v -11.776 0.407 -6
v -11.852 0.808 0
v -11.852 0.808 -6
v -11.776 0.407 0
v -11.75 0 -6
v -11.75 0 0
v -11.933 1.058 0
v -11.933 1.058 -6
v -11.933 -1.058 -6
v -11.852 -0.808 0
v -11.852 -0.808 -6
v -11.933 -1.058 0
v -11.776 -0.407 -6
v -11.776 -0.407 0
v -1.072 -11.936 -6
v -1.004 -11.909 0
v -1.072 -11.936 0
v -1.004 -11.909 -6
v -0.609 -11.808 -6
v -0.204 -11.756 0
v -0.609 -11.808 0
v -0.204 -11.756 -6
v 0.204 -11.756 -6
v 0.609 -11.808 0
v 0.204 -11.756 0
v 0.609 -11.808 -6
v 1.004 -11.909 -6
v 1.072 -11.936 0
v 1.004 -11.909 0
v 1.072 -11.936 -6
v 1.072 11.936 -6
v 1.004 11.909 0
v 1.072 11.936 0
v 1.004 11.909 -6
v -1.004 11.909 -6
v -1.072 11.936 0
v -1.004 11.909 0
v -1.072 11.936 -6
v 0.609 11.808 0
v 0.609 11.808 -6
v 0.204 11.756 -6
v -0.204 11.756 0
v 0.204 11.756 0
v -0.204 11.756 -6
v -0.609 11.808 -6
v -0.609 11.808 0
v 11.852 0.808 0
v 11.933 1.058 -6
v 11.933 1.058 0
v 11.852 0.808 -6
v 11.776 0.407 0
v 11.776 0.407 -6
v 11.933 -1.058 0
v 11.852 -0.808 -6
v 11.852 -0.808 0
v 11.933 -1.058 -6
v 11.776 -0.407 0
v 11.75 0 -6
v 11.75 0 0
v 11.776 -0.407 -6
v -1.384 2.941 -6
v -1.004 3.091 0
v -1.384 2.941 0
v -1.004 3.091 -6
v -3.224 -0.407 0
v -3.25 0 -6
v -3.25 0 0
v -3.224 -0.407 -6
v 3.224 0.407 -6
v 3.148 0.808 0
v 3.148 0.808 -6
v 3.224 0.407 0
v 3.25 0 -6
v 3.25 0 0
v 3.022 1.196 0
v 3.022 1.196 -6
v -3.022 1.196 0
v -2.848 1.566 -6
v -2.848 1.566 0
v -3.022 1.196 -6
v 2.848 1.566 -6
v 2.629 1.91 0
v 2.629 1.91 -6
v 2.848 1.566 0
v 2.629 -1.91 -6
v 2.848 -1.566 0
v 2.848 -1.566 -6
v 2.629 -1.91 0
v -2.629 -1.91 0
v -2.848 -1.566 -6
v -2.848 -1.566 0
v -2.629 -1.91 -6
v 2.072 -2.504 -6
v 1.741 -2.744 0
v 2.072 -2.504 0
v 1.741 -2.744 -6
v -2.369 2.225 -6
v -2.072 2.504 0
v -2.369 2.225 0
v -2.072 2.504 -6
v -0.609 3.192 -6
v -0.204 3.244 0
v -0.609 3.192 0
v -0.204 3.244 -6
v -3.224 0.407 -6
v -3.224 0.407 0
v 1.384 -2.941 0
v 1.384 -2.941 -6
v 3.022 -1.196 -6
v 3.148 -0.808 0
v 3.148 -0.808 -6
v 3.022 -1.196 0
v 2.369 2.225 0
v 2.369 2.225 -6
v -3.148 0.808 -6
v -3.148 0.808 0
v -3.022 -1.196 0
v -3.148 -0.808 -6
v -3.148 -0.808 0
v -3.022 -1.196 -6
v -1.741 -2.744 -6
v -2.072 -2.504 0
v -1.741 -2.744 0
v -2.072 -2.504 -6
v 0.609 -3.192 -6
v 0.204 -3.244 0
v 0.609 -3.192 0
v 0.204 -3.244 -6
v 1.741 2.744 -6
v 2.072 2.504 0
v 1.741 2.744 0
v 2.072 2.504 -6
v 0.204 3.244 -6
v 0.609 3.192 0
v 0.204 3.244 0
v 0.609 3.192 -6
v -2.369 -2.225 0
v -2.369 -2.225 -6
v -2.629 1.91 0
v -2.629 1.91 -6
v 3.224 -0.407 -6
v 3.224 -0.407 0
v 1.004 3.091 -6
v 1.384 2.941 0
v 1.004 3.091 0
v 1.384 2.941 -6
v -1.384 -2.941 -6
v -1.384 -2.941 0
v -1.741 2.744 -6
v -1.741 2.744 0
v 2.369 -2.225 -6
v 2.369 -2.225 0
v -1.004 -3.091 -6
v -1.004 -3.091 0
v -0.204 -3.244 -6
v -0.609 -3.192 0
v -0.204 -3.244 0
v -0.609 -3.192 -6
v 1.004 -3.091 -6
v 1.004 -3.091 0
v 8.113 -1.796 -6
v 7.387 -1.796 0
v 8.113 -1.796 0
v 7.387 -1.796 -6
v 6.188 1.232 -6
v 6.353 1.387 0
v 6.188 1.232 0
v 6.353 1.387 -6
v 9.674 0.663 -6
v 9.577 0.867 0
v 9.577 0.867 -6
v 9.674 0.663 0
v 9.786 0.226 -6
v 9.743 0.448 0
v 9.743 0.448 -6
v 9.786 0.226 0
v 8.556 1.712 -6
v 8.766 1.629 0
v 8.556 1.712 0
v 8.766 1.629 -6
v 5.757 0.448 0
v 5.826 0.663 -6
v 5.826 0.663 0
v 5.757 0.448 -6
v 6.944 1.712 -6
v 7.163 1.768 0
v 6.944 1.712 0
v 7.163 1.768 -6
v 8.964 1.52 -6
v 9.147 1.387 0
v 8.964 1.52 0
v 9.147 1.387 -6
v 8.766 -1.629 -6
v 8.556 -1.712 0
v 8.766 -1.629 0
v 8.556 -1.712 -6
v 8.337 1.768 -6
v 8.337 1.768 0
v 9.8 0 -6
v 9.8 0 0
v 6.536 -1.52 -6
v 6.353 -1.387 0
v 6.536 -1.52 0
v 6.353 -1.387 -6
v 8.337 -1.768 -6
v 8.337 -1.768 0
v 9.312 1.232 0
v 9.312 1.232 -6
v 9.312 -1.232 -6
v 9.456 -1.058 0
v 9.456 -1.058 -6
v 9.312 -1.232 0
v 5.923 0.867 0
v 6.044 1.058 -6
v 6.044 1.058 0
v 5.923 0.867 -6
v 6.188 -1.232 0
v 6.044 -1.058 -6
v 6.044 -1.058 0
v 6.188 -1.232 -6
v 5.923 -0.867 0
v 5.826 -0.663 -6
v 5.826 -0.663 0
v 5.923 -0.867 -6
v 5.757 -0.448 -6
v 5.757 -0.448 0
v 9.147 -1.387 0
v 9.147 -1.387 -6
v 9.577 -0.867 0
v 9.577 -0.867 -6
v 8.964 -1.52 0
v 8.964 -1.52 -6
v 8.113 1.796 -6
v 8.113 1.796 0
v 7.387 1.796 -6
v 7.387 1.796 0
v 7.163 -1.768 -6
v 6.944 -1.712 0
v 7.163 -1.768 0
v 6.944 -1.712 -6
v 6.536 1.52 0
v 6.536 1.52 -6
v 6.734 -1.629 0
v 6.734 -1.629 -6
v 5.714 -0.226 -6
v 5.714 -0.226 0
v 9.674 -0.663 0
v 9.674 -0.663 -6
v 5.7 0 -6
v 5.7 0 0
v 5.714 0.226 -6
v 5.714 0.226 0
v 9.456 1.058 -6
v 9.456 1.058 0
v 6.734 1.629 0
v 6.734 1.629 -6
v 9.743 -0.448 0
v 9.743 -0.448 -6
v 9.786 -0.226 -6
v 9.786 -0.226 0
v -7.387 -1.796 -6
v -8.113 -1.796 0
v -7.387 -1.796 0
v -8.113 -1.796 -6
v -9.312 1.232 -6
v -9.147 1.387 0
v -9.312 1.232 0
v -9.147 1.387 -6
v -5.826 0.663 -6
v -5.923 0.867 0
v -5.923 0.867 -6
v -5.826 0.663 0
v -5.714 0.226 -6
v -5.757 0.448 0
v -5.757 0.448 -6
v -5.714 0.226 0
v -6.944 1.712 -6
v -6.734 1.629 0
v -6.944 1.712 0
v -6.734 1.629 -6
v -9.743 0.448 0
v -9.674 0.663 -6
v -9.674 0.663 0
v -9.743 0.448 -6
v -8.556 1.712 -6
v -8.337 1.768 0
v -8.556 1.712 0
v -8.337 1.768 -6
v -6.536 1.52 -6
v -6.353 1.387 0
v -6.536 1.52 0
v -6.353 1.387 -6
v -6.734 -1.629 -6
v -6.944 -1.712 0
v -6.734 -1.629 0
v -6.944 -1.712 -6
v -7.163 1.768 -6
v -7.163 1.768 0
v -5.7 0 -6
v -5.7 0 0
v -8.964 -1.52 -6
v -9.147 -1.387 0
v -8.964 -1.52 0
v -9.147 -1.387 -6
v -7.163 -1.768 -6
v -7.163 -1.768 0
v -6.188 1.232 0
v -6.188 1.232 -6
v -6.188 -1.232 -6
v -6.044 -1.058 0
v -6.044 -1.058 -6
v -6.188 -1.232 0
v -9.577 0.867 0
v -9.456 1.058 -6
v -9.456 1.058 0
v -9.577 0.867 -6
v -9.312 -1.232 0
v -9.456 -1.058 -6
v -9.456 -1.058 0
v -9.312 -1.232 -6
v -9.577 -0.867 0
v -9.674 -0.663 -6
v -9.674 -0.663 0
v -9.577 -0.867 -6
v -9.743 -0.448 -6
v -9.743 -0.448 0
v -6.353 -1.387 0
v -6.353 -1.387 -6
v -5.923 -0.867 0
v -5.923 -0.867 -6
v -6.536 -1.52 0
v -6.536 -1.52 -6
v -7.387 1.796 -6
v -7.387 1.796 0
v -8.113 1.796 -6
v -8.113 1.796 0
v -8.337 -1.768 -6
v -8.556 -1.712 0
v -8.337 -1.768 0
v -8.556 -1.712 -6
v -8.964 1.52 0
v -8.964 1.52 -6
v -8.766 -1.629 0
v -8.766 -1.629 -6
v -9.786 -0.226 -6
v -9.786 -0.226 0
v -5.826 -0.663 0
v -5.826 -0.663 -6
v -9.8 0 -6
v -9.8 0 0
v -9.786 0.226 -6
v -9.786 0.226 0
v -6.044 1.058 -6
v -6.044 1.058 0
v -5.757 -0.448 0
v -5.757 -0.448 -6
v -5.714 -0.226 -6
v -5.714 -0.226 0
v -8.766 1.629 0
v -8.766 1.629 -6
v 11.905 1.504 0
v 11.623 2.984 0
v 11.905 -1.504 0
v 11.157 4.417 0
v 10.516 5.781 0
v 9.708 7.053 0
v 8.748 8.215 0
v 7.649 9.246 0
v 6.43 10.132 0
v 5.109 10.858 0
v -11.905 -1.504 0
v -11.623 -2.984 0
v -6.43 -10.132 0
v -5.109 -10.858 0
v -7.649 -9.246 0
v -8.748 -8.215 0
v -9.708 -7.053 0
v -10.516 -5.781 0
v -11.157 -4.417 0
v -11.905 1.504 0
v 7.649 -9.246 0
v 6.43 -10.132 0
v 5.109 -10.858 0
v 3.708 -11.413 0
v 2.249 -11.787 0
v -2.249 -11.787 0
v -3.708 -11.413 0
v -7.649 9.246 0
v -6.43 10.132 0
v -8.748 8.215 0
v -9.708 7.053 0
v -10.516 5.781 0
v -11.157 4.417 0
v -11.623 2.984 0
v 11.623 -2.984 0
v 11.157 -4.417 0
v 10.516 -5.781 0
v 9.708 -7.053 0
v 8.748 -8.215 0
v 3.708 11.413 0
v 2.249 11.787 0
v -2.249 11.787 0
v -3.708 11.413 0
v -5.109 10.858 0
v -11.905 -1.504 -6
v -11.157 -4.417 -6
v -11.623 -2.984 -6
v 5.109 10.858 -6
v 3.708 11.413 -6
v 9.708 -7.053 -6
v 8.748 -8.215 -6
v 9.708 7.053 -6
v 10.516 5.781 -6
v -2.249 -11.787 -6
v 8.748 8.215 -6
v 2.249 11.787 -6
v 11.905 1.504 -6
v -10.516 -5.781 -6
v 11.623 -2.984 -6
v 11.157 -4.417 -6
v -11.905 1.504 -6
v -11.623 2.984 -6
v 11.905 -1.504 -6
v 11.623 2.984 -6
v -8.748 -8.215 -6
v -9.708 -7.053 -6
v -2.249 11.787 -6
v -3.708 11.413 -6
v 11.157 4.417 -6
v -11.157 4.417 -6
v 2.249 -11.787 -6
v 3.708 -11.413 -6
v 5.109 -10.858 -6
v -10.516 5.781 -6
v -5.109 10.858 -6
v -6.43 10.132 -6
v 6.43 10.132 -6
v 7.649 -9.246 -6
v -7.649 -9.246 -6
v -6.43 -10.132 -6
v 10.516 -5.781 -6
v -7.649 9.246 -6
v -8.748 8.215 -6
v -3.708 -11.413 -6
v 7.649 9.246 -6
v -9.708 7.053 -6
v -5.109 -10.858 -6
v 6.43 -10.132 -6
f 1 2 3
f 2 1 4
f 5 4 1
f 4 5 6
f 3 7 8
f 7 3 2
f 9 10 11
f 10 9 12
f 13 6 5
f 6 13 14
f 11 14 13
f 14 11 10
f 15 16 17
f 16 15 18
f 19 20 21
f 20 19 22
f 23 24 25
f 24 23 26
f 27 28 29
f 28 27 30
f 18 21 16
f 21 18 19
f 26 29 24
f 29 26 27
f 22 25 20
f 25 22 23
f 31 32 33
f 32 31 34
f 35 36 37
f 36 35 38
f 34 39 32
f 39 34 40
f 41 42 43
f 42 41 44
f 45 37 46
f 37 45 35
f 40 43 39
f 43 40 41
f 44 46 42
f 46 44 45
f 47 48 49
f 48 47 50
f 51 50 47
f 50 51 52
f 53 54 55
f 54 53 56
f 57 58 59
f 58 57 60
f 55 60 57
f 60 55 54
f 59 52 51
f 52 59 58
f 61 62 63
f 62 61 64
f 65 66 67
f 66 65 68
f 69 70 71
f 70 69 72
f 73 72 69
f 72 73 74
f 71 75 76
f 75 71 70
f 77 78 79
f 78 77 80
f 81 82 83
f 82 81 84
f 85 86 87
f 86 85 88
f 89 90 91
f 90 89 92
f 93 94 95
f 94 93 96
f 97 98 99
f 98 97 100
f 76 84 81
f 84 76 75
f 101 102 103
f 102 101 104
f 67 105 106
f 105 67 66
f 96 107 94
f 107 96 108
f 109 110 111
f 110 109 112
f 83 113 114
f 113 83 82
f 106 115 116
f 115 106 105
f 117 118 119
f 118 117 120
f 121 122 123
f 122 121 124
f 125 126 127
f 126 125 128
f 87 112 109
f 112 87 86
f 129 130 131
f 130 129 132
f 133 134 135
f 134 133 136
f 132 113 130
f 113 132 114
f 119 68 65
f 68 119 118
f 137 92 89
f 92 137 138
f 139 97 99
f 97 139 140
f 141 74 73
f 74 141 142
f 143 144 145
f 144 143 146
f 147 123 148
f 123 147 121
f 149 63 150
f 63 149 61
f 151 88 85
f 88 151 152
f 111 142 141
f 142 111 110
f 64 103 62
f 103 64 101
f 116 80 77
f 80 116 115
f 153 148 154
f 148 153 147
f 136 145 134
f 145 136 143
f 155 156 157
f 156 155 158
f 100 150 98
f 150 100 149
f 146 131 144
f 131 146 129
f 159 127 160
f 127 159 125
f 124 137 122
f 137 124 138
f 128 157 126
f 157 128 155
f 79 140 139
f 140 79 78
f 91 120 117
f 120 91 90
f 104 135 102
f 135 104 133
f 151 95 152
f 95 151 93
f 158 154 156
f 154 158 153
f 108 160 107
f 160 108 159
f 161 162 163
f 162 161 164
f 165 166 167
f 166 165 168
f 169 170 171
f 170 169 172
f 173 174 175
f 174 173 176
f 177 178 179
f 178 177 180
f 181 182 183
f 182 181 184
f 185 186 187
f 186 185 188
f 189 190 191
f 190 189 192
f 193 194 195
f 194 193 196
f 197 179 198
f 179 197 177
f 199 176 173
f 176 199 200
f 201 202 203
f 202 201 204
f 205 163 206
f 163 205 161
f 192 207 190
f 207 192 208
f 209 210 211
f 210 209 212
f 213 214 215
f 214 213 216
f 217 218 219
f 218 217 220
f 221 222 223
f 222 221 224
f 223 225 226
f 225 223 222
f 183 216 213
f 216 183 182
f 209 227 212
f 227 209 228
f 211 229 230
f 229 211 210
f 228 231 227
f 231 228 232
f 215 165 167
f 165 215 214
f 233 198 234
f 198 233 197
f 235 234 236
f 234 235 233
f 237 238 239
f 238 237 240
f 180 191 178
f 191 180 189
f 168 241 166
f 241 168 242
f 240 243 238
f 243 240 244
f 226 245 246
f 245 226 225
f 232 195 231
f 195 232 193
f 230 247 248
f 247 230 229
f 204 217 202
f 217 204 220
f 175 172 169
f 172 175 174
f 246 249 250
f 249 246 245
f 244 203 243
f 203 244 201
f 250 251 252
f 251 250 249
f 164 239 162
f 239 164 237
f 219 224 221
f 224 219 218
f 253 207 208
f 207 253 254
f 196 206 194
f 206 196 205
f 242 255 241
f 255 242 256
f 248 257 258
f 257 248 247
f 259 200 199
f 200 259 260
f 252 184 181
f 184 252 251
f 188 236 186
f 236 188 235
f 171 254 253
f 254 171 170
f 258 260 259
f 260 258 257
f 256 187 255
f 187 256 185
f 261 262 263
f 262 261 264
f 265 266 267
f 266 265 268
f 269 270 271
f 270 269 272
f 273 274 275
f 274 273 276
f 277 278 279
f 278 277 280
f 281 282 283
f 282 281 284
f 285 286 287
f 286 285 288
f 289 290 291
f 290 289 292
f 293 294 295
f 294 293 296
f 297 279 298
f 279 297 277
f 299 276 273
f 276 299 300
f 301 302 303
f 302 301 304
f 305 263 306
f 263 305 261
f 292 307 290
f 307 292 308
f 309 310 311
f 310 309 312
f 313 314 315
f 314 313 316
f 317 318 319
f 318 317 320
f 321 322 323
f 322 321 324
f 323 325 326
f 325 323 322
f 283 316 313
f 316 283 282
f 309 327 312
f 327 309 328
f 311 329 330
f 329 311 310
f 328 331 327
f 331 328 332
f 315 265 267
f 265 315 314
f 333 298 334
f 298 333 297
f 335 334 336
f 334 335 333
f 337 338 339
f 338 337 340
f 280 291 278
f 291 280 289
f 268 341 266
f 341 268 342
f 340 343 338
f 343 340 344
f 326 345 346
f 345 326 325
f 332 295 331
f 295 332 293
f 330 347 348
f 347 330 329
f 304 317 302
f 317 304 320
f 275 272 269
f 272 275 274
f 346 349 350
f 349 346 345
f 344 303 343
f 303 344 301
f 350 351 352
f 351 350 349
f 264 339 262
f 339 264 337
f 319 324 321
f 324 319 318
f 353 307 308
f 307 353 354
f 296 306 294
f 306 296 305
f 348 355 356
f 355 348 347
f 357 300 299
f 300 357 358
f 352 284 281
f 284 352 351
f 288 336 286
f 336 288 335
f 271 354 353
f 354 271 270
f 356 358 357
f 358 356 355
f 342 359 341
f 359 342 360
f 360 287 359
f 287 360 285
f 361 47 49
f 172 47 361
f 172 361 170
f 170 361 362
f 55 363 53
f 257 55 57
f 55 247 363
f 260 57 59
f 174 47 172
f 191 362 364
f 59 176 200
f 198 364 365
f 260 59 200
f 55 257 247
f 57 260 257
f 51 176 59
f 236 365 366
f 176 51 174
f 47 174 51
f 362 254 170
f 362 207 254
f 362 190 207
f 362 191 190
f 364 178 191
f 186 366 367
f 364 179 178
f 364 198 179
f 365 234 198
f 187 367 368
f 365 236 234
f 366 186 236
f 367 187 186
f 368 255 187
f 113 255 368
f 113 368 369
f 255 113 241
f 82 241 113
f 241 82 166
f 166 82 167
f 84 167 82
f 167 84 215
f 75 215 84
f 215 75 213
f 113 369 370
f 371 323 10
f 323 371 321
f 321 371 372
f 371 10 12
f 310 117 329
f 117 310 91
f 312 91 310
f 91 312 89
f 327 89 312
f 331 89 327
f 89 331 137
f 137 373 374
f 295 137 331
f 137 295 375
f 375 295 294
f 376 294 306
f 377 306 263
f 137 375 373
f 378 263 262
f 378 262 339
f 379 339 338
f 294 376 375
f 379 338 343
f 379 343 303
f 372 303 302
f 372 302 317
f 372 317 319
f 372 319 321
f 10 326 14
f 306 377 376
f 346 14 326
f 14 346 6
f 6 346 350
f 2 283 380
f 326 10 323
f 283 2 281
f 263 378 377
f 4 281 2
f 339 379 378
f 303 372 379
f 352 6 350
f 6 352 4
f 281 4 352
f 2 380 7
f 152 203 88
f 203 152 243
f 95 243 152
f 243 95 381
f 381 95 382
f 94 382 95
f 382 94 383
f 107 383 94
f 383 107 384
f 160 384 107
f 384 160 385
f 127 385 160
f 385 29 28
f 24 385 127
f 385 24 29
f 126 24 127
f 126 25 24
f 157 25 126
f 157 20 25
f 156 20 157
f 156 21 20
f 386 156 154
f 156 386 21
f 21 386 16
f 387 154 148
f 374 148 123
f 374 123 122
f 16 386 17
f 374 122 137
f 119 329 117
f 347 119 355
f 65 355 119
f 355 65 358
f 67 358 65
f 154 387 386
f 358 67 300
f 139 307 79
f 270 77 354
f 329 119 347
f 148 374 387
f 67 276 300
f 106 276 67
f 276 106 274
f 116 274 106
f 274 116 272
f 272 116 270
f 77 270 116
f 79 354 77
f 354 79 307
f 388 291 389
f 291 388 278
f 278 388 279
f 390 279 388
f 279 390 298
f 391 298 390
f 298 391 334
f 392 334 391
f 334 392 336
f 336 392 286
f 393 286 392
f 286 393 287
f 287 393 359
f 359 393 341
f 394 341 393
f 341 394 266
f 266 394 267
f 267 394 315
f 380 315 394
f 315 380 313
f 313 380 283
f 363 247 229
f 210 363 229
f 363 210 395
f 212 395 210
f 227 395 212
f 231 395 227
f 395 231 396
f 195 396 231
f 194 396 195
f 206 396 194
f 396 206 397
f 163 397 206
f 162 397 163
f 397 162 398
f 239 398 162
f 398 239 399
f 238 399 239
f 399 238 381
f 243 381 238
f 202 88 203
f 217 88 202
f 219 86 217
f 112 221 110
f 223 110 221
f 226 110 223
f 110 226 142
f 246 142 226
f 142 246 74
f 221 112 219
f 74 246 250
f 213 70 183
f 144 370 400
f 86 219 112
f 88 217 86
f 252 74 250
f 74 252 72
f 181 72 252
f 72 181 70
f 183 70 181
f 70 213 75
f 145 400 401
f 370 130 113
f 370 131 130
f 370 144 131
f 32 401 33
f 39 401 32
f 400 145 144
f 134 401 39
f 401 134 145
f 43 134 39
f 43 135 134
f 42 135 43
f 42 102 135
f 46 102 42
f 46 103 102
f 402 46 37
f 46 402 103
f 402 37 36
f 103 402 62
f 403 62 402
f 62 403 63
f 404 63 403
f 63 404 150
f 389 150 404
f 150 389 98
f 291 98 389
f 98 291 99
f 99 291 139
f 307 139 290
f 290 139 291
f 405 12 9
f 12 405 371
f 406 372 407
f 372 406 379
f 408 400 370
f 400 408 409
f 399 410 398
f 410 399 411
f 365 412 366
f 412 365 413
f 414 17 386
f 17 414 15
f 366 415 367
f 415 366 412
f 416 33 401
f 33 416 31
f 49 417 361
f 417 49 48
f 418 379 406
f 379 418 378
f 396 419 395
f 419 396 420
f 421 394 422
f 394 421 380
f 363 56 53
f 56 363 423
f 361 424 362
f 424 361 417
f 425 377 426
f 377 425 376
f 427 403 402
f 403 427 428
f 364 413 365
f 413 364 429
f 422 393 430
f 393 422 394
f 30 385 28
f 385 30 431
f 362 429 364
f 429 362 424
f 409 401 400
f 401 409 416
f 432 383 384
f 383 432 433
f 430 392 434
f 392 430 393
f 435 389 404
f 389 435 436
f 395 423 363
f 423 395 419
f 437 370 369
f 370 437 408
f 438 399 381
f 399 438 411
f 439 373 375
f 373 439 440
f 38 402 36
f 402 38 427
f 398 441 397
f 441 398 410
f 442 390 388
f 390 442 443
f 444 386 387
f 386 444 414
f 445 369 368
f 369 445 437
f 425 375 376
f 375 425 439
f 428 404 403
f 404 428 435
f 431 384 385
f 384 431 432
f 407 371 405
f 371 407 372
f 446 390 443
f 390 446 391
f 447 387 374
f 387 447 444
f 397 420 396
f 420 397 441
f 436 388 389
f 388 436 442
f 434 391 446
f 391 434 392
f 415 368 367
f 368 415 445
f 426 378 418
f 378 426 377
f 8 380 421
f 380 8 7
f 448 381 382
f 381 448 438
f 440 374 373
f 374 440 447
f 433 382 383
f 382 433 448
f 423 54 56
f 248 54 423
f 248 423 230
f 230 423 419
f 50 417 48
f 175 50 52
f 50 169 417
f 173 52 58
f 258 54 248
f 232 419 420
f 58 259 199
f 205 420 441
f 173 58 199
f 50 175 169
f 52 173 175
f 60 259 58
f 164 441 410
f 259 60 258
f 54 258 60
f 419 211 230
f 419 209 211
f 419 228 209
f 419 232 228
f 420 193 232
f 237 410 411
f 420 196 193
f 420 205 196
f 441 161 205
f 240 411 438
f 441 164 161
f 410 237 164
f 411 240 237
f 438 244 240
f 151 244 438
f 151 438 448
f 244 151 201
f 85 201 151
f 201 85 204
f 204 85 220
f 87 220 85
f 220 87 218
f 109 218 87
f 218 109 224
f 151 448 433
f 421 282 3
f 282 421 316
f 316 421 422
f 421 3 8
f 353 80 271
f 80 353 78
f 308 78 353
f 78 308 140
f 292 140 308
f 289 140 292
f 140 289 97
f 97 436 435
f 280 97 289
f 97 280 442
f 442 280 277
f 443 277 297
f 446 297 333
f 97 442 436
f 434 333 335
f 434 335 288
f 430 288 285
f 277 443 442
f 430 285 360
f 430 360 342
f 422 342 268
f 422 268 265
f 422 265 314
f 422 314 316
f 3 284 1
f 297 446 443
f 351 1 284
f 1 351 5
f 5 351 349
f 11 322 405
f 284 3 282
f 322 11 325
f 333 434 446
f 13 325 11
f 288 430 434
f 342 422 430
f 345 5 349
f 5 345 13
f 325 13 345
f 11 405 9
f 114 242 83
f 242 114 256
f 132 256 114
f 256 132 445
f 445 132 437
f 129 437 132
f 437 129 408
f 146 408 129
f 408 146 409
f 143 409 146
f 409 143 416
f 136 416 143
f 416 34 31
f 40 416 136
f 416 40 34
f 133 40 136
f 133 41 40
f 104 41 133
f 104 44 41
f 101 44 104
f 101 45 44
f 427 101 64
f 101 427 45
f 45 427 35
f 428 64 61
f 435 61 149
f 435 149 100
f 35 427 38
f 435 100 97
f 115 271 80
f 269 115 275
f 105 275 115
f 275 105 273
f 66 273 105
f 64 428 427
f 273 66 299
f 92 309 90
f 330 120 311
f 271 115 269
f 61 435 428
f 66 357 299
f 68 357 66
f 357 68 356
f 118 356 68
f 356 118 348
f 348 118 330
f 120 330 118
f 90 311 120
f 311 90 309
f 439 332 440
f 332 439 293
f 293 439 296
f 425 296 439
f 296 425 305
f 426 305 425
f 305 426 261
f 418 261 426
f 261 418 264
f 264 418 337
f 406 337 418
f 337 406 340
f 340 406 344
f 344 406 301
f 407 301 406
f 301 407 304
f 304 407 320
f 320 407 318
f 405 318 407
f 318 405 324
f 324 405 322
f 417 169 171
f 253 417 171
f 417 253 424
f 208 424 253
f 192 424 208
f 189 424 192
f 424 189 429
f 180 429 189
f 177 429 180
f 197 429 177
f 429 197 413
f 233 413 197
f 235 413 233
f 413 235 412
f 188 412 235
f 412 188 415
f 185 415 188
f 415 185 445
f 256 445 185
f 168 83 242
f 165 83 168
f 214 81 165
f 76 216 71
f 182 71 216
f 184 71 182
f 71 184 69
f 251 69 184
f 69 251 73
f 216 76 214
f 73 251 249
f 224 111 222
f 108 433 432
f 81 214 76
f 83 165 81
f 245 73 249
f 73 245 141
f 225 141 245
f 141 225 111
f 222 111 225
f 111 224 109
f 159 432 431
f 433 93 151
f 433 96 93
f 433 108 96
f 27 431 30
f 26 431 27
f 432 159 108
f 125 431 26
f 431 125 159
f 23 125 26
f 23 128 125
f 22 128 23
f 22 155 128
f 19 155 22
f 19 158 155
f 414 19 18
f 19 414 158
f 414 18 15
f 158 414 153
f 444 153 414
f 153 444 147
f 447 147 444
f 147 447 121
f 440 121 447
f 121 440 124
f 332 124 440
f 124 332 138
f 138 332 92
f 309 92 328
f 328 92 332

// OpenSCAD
$fn = 50;


difference() {
	union() {
		translate(v = [0, 0, -6.0000000000]) {
			rotate(a = [0, 0, 0]) {
				cylinder(h = 12, r = 12.0000000000);
			}
		}
	}
	union() {
		translate(v = [0, 0, 0]) {
			rotate(a = [0, 0, 0]) {
				translate(v = [0, 0, -3.5000000000]) {
					union() {
						difference() {
							translate(v = [0, 0, 0]) {
								rotate(a = [0, 0, 0]) {
									cylinder(h = 7, r = 32.7000000000);
								}
							}
							translate(v = [0, 0, 0]) {
								rotate(a = [0, 0, 0]) {
									cylinder(h = 7, r = 25.0000000000);
								}
							}
						}
						difference() {
							translate(v = [0, 0, -50]) {
								rotate(a = [0, 0, 0]) {
									cylinder(h = 100, r = 29.3500000000);
								}
							}
							translate(v = [0, 0, -50]) {
								rotate(a = [0, 0, 0]) {
									cylinder(h = 100, r = 28.3500000000);
								}
							}
						}
					}
				}
			}
		}
		translate(v = [-30.0000000000, -30.0000000000, -125.0000000000]) {
			rotate(a = [0, 0, 0]) {
				cylinder(h = 250, r = 3.2500000000);
			}
		}
		translate(v = [-30.0000000000, 30.0000000000, -125.0000000000]) {
			rotate(a = [0, 0, 0]) {
				cylinder(h = 250, r = 3.2500000000);
			}
		}
		translate(v = [30.0000000000, -30.0000000000, -125.0000000000]) {
			rotate(a = [0, 0, 0]) {
				cylinder(h = 250, r = 3.2500000000);
			}
		}
		translate(v = [30.0000000000, 30.0000000000, -125.0000000000]) {
			rotate(a = [0, 0, 0]) {
				cylinder(h = 250, r = 3.2500000000);
			}
		}
		translate(v = [-45.0000000000, -30.0000000000, -125.0000000000]) {
			rotate(a = [0, 0, 0]) {
				cylinder(h = 250, r = 3.2500000000);
			}
		}
		translate(v = [-45.0000000000, -15.0000000000, -125.0000000000]) {
			rotate(a = [0, 0, 0]) {
				cylinder(h = 250, r = 3.2500000000);
			}
		}
		translate(v = [-45.0000000000, 0.0000000000, -125.0000000000]) {
			rotate(a = [0, 0, 0]) {
				cylinder(h = 250, r = 3.2500000000);
			}
		}
		translate(v = [-45.0000000000, 15.0000000000, -125.0000000000]) {
			rotate(a = [0, 0, 0]) {
				cylinder(h = 250, r = 3.2500000000);
			}
		}
		translate(v = [-45.0000000000, 30.0000000000, -125.0000000000]) {
			rotate(a = [0, 0, 0]) {
				cylinder(h = 250, r = 3.2500000000);
			}
		}
		translate(v = [45.0000000000, -30.0000000000, -125.0000000000]) {
			rotate(a = [0, 0, 0]) {
				cylinder(h = 250, r = 3.2500000000);
			}
		}
		translate(v = [45.0000000000, -15.0000000000, -125.0000000000]) {
			rotate(a = [0, 0, 0]) {
				cylinder(h = 250, r = 3.2500000000);
			}
		}
		translate(v = [45.0000000000, 0.0000000000, -125.0000000000]) {
			rotate(a = [0, 0, 0]) {
				cylinder(h = 250, r = 3.2500000000);
			}
		}
		translate(v = [45.0000000000, 15.0000000000, -125.0000000000]) {
			rotate(a = [0, 0, 0]) {
				cylinder(h = 250, r = 3.2500000000);
			}
		}
		translate(v = [45.0000000000, 30.0000000000, -125.0000000000]) {
			rotate(a = [0, 0, 0]) {
				cylinder(h = 250, r = 3.2500000000);
			}
		}
		translate(v = [45.0000000000, -30.0000000000, -125.0000000000]) {
			rotate(a = [0, 0, 0]) {
				cylinder(h = 250, r = 3.2500000000);
			}
		}
		translate(v = [45.0000000000, -15.0000000000, -125.0000000000]) {
			rotate(a = [0, 0, 0]) {
				cylinder(h = 250, r = 3.2500000000);
			}
		}
		translate(v = [45.0000000000, 0.0000000000, -125.0000000000]) {
			rotate(a = [0, 0, 0]) {
				cylinder(h = 250, r = 3.2500000000);
			}
		}
		translate(v = [45.0000000000, 15.0000000000, -125.0000000000]) {
			rotate(a = [0, 0, 0]) {
				cylinder(h = 250, r = 3.2500000000);
			}
		}
		translate(v = [45.0000000000, 30.0000000000, -125.0000000000]) {
			rotate(a = [0, 0, 0]) {
				cylinder(h = 250, r = 3.2500000000);
			}
		}
		translate(v = [-15.0000000000, 0.0000000000, -125.0000000000]) {
			rotate(a = [0, 0, 0]) {
				cylinder(h = 250, r = 3.2500000000);
			}
		}
		translate(v = [0.0000000000, -15.0000000000, -125.0000000000]) {
			rotate(a = [0, 0, 0]) {
				cylinder(h = 250, r = 3.2500000000);
			}
		}
		translate(v = [0.0000000000, 15.0000000000, -125.0000000000]) {
			rotate(a = [0, 0, 0]) {
				cylinder(h = 250, r = 3.2500000000);
			}
		}
		translate(v = [15.0000000000, 0.0000000000, -125.0000000000]) {
			rotate(a = [0, 0, 0]) {
				cylinder(h = 250, r = 3.2500000000);
			}
		}
		translate(v = [0, 0, -125.0000000000]) {
			rotate(a = [0, 0, 0]) {
				cylinder(h = 250, r = 3.2500000000);
			}
		}
		translate(v = [30.0000000000, -22.0000000000, 4.1000000000]) {
			rotate(a = [0, 0, 15.0000000000]) {
				cylinder(h = 1.9000000000, r1 = 1.8000000000, r2 = 3.6000000000);
			}
		}
		translate(v = [30.0000000000, -22.0000000000, -6.0000000000]) {
			rotate(a = [0, 0, 15.0000000000]) {
				cylinder(h = 12, r = 1.8000000000);
			}
		}
		translate(v = [30.0000000000, -22.0000000000, -6.0000000000]) {
			rotate(a = [0, 0, 15.0000000000]) {
				translate(v = [0, 0, 0]) {
					rotate(a = [0, 0, 15.0000000000]) {
						linear_extrude(height = 3) {
							polygon(points = [[3.4620000000, 0.0000000000], [1.7310000000, 2.9981799479], [-1.7310000000, 2.9981799479], [-3.4620000000, 0.0000000000], [-1.7310000000, -2.9981799479], [1.7310000000, -2.9981799479]]);
						}
					}
				}
			}
		}
		translate(v = [28.2500000000, -25.2500000000, -3.0000000000]) {
			rotate(a = [0, 0, 0]) {
				cube(size = [3.5000000000, 6.5000000000, 0.3000000000]);
			}
		}
		translate(v = [28.2500000000, -23.7500000000, -2.7000000000]) {
			rotate(a = [0, 0, 0]) {
				cube(size = [3.5000000000, 3.5000000000, 0.3000000000]);
			}
		}
		translate(v = [28.2500000000, -25.2500000000, -6.3000000000]) {
			rotate(a = [0, 0, 0]) {
				cube(size = [3.5000000000, 6.5000000000, 0.3000000000]);
			}
		}
		translate(v = [28.2500000000, -23.7500000000, -6.6000000000]) {
			rotate(a = [0, 0, 0]) {
				cube(size = [3.5000000000, 3.5000000000, 0.3000000000]);
			}
		}
		translate(v = [-22.0000000000, -30.0000000000, -4.1000000000]) {
			rotate(a = [0, 180, 0]) {
				cylinder(h = 1.9000000000, r1 = 1.8000000000, r2 = 3.6000000000);
			}
		}
		translate(v = [-22.0000000000, -30.0000000000, 6.0000000000]) {
			rotate(a = [0, 180, 0]) {
				cylinder(h = 12, r = 1.8000000000);
			}
		}
		translate(v = [-22.0000000000, -30.0000000000, 3.0000000000]) {
			rotate(a = [0, 180, 0]) {
				translate(v = [0, 0, 0]) {
					rotate(a = [0, 180, 0]) {
						linear_extrude(height = 3) {
							polygon(points = [[3.4620000000, 0.0000000000], [1.7310000000, 2.9981799479], [-1.7310000000, 2.9981799479], [-3.4620000000, 0.0000000000], [-1.7310000000, -2.9981799479], [1.7310000000, -2.9981799479]]);
						}
					}
				}
			}
		}
		translate(v = [-23.7500000000, -33.2500000000, 6.0000000000]) {
			rotate(a = [0, 0, 0]) {
				cube(size = [3.5000000000, 6.5000000000, 0.3000000000]);
			}
		}
		translate(v = [-23.7500000000, -31.7500000000, 6.3000000000]) {
			rotate(a = [0, 0, 0]) {
				cube(size = [3.5000000000, 3.5000000000, 0.3000000000]);
			}
		}
		translate(v = [-23.7500000000, -33.2500000000, 2.7000000000]) {
			rotate(a = [0, 0, 0]) {
				cube(size = [3.5000000000, 6.5000000000, 0.3000000000]);
			}
		}
		translate(v = [-23.7500000000, -31.7500000000, 2.4000000000]) {
			rotate(a = [0, 0, 0]) {
				cube(size = [3.5000000000, 3.5000000000, 0.3000000000]);
			}
		}
		translate(v = [-30.0000000000, 22.0000000000, 4.1000000000]) {
			rotate(a = [0, 0, 15.0000000000]) {
				cylinder(h = 1.9000000000, r1 = 1.8000000000, r2 = 3.6000000000);
			}
		}
		translate(v = [-30.0000000000, 22.0000000000, -6.0000000000]) {
			rotate(a = [0, 0, 15.0000000000]) {
				cylinder(h = 12, r = 1.8000000000);
			}
		}
		translate(v = [-30.0000000000, 22.0000000000, -6.0000000000]) {
			rotate(a = [0, 0, 15.0000000000]) {
				translate(v = [0, 0, 0]) {
					rotate(a = [0, 0, 15.0000000000]) {
						linear_extrude(height = 3) {
							polygon(points = [[3.4620000000, 0.0000000000], [1.7310000000, 2.9981799479], [-1.7310000000, 2.9981799479], [-3.4620000000, 0.0000000000], [-1.7310000000, -2.9981799479], [1.7310000000, -2.9981799479]]);
						}
					}
				}
			}
		}
		translate(v = [-31.7500000000, 18.7500000000, -3.0000000000]) {
			rotate(a = [0, 0, 0]) {
				cube(size = [3.5000000000, 6.5000000000, 0.3000000000]);
			}
		}
		translate(v = [-31.7500000000, 20.2500000000, -2.7000000000]) {
			rotate(a = [0, 0, 0]) {
				cube(size = [3.5000000000, 3.5000000000, 0.3000000000]);
			}
		}
		translate(v = [-31.7500000000, 18.7500000000, -6.3000000000]) {
			rotate(a = [0, 0, 0]) {
				cube(size = [3.5000000000, 6.5000000000, 0.3000000000]);
			}
		}
		translate(v = [-31.7500000000, 20.2500000000, -6.6000000000]) {
			rotate(a = [0, 0, 0]) {
				cube(size = [3.5000000000, 3.5000000000, 0.3000000000]);
			}
		}
		translate(v = [22.0000000000, 30.0000000000, -4.1000000000]) {
			rotate(a = [0, 180, 0]) {
				cylinder(h = 1.9000000000, r1 = 1.8000000000, r2 = 3.6000000000);
			}
		}
		translate(v = [22.0000000000, 30.0000000000, 6.0000000000]) {
			rotate(a = [0, 180, 0]) {
				cylinder(h = 12, r = 1.8000000000);
			}
		}
		translate(v = [22.0000000000, 30.0000000000, 3.0000000000]) {
			rotate(a = [0, 180, 0]) {
				translate(v = [0, 0, 0]) {
					rotate(a = [0, 180, 0]) {
						linear_extrude(height = 3) {
							polygon(points = [[3.4620000000, 0.0000000000], [1.7310000000, 2.9981799479], [-1.7310000000, 2.9981799479], [-3.4620000000, 0.0000000000], [-1.7310000000, -2.9981799479], [1.7310000000, -2.9981799479]]);
						}
					}
				}
			}
		}
		translate(v = [20.2500000000, 26.7500000000, 6.0000000000]) {
			rotate(a = [0, 0, 0]) {
				cube(size = [3.5000000000, 6.5000000000, 0.3000000000]);
			}
		}
		translate(v = [20.2500000000, 28.2500000000, 6.3000000000]) {
			rotate(a = [0, 0, 0]) {
				cube(size = [3.5000000000, 3.5000000000, 0.3000000000]);
			}
		}
		translate(v = [20.2500000000, 26.7500000000, 2.7000000000]) {
			rotate(a = [0, 0, 0]) {
				cube(size = [3.5000000000, 6.5000000000, 0.3000000000]);
			}
		}
		translate(v = [20.2500000000, 28.2500000000, 2.4000000000]) {
			rotate(a = [0, 0, 0]) {
				cube(size = [3.5000000000, 3.5000000000, 0.3000000000]);
			}
		}
		translate(v = [7.7500000000, 0, -125.0000000000]) {
			rotate(a = [0, 0, 0]) {
				hull() {
					translate(v = [0.2500000000, 0, 0]) {
						rotate(a = [0, 0, 0]) {
							translate(v = [0, 0, 0]) {
								rotate(a = [0, 0, 0]) {
									cylinder(h = 250, r = 1.8000000000);
								}
							}
						}
					}
					translate(v = [-0.2500000000, 0, 0]) {
						rotate(a = [0, 0, 0]) {
							translate(v = [0, 0, 0]) {
								rotate(a = [0, 0, 0]) {
									cylinder(h = 250, r = 1.8000000000);
								}
							}
						}
					}
				}
			}
		}
		translate(v = [-7.7500000000, 0, -125.0000000000]) {
			rotate(a = [0, 0, 0]) {
				hull() {
					translate(v = [0.2500000000, 0, 0]) {
						rotate(a = [0, 0, 0]) {
							translate(v = [0, 0, 0]) {
								rotate(a = [0, 0, 0]) {
									cylinder(h = 250, r = 1.8000000000);
								}
							}
						}
					}
					translate(v = [-0.2500000000, 0, 0]) {
						rotate(a = [0, 0, 0]) {
							translate(v = [0, 0, 0]) {
								rotate(a = [0, 0, 0]) {
									cylinder(h = 250, r = 1.8000000000);
								}
							}
						}
					}
				}
			}
		}
		translate(v = [-250.0000000000, -250.0000000000, 0]) {
			rotate(a = [0, 0, 0]) {
				cube(size = [500, 500, 500]);
			}
		}
	}
}
